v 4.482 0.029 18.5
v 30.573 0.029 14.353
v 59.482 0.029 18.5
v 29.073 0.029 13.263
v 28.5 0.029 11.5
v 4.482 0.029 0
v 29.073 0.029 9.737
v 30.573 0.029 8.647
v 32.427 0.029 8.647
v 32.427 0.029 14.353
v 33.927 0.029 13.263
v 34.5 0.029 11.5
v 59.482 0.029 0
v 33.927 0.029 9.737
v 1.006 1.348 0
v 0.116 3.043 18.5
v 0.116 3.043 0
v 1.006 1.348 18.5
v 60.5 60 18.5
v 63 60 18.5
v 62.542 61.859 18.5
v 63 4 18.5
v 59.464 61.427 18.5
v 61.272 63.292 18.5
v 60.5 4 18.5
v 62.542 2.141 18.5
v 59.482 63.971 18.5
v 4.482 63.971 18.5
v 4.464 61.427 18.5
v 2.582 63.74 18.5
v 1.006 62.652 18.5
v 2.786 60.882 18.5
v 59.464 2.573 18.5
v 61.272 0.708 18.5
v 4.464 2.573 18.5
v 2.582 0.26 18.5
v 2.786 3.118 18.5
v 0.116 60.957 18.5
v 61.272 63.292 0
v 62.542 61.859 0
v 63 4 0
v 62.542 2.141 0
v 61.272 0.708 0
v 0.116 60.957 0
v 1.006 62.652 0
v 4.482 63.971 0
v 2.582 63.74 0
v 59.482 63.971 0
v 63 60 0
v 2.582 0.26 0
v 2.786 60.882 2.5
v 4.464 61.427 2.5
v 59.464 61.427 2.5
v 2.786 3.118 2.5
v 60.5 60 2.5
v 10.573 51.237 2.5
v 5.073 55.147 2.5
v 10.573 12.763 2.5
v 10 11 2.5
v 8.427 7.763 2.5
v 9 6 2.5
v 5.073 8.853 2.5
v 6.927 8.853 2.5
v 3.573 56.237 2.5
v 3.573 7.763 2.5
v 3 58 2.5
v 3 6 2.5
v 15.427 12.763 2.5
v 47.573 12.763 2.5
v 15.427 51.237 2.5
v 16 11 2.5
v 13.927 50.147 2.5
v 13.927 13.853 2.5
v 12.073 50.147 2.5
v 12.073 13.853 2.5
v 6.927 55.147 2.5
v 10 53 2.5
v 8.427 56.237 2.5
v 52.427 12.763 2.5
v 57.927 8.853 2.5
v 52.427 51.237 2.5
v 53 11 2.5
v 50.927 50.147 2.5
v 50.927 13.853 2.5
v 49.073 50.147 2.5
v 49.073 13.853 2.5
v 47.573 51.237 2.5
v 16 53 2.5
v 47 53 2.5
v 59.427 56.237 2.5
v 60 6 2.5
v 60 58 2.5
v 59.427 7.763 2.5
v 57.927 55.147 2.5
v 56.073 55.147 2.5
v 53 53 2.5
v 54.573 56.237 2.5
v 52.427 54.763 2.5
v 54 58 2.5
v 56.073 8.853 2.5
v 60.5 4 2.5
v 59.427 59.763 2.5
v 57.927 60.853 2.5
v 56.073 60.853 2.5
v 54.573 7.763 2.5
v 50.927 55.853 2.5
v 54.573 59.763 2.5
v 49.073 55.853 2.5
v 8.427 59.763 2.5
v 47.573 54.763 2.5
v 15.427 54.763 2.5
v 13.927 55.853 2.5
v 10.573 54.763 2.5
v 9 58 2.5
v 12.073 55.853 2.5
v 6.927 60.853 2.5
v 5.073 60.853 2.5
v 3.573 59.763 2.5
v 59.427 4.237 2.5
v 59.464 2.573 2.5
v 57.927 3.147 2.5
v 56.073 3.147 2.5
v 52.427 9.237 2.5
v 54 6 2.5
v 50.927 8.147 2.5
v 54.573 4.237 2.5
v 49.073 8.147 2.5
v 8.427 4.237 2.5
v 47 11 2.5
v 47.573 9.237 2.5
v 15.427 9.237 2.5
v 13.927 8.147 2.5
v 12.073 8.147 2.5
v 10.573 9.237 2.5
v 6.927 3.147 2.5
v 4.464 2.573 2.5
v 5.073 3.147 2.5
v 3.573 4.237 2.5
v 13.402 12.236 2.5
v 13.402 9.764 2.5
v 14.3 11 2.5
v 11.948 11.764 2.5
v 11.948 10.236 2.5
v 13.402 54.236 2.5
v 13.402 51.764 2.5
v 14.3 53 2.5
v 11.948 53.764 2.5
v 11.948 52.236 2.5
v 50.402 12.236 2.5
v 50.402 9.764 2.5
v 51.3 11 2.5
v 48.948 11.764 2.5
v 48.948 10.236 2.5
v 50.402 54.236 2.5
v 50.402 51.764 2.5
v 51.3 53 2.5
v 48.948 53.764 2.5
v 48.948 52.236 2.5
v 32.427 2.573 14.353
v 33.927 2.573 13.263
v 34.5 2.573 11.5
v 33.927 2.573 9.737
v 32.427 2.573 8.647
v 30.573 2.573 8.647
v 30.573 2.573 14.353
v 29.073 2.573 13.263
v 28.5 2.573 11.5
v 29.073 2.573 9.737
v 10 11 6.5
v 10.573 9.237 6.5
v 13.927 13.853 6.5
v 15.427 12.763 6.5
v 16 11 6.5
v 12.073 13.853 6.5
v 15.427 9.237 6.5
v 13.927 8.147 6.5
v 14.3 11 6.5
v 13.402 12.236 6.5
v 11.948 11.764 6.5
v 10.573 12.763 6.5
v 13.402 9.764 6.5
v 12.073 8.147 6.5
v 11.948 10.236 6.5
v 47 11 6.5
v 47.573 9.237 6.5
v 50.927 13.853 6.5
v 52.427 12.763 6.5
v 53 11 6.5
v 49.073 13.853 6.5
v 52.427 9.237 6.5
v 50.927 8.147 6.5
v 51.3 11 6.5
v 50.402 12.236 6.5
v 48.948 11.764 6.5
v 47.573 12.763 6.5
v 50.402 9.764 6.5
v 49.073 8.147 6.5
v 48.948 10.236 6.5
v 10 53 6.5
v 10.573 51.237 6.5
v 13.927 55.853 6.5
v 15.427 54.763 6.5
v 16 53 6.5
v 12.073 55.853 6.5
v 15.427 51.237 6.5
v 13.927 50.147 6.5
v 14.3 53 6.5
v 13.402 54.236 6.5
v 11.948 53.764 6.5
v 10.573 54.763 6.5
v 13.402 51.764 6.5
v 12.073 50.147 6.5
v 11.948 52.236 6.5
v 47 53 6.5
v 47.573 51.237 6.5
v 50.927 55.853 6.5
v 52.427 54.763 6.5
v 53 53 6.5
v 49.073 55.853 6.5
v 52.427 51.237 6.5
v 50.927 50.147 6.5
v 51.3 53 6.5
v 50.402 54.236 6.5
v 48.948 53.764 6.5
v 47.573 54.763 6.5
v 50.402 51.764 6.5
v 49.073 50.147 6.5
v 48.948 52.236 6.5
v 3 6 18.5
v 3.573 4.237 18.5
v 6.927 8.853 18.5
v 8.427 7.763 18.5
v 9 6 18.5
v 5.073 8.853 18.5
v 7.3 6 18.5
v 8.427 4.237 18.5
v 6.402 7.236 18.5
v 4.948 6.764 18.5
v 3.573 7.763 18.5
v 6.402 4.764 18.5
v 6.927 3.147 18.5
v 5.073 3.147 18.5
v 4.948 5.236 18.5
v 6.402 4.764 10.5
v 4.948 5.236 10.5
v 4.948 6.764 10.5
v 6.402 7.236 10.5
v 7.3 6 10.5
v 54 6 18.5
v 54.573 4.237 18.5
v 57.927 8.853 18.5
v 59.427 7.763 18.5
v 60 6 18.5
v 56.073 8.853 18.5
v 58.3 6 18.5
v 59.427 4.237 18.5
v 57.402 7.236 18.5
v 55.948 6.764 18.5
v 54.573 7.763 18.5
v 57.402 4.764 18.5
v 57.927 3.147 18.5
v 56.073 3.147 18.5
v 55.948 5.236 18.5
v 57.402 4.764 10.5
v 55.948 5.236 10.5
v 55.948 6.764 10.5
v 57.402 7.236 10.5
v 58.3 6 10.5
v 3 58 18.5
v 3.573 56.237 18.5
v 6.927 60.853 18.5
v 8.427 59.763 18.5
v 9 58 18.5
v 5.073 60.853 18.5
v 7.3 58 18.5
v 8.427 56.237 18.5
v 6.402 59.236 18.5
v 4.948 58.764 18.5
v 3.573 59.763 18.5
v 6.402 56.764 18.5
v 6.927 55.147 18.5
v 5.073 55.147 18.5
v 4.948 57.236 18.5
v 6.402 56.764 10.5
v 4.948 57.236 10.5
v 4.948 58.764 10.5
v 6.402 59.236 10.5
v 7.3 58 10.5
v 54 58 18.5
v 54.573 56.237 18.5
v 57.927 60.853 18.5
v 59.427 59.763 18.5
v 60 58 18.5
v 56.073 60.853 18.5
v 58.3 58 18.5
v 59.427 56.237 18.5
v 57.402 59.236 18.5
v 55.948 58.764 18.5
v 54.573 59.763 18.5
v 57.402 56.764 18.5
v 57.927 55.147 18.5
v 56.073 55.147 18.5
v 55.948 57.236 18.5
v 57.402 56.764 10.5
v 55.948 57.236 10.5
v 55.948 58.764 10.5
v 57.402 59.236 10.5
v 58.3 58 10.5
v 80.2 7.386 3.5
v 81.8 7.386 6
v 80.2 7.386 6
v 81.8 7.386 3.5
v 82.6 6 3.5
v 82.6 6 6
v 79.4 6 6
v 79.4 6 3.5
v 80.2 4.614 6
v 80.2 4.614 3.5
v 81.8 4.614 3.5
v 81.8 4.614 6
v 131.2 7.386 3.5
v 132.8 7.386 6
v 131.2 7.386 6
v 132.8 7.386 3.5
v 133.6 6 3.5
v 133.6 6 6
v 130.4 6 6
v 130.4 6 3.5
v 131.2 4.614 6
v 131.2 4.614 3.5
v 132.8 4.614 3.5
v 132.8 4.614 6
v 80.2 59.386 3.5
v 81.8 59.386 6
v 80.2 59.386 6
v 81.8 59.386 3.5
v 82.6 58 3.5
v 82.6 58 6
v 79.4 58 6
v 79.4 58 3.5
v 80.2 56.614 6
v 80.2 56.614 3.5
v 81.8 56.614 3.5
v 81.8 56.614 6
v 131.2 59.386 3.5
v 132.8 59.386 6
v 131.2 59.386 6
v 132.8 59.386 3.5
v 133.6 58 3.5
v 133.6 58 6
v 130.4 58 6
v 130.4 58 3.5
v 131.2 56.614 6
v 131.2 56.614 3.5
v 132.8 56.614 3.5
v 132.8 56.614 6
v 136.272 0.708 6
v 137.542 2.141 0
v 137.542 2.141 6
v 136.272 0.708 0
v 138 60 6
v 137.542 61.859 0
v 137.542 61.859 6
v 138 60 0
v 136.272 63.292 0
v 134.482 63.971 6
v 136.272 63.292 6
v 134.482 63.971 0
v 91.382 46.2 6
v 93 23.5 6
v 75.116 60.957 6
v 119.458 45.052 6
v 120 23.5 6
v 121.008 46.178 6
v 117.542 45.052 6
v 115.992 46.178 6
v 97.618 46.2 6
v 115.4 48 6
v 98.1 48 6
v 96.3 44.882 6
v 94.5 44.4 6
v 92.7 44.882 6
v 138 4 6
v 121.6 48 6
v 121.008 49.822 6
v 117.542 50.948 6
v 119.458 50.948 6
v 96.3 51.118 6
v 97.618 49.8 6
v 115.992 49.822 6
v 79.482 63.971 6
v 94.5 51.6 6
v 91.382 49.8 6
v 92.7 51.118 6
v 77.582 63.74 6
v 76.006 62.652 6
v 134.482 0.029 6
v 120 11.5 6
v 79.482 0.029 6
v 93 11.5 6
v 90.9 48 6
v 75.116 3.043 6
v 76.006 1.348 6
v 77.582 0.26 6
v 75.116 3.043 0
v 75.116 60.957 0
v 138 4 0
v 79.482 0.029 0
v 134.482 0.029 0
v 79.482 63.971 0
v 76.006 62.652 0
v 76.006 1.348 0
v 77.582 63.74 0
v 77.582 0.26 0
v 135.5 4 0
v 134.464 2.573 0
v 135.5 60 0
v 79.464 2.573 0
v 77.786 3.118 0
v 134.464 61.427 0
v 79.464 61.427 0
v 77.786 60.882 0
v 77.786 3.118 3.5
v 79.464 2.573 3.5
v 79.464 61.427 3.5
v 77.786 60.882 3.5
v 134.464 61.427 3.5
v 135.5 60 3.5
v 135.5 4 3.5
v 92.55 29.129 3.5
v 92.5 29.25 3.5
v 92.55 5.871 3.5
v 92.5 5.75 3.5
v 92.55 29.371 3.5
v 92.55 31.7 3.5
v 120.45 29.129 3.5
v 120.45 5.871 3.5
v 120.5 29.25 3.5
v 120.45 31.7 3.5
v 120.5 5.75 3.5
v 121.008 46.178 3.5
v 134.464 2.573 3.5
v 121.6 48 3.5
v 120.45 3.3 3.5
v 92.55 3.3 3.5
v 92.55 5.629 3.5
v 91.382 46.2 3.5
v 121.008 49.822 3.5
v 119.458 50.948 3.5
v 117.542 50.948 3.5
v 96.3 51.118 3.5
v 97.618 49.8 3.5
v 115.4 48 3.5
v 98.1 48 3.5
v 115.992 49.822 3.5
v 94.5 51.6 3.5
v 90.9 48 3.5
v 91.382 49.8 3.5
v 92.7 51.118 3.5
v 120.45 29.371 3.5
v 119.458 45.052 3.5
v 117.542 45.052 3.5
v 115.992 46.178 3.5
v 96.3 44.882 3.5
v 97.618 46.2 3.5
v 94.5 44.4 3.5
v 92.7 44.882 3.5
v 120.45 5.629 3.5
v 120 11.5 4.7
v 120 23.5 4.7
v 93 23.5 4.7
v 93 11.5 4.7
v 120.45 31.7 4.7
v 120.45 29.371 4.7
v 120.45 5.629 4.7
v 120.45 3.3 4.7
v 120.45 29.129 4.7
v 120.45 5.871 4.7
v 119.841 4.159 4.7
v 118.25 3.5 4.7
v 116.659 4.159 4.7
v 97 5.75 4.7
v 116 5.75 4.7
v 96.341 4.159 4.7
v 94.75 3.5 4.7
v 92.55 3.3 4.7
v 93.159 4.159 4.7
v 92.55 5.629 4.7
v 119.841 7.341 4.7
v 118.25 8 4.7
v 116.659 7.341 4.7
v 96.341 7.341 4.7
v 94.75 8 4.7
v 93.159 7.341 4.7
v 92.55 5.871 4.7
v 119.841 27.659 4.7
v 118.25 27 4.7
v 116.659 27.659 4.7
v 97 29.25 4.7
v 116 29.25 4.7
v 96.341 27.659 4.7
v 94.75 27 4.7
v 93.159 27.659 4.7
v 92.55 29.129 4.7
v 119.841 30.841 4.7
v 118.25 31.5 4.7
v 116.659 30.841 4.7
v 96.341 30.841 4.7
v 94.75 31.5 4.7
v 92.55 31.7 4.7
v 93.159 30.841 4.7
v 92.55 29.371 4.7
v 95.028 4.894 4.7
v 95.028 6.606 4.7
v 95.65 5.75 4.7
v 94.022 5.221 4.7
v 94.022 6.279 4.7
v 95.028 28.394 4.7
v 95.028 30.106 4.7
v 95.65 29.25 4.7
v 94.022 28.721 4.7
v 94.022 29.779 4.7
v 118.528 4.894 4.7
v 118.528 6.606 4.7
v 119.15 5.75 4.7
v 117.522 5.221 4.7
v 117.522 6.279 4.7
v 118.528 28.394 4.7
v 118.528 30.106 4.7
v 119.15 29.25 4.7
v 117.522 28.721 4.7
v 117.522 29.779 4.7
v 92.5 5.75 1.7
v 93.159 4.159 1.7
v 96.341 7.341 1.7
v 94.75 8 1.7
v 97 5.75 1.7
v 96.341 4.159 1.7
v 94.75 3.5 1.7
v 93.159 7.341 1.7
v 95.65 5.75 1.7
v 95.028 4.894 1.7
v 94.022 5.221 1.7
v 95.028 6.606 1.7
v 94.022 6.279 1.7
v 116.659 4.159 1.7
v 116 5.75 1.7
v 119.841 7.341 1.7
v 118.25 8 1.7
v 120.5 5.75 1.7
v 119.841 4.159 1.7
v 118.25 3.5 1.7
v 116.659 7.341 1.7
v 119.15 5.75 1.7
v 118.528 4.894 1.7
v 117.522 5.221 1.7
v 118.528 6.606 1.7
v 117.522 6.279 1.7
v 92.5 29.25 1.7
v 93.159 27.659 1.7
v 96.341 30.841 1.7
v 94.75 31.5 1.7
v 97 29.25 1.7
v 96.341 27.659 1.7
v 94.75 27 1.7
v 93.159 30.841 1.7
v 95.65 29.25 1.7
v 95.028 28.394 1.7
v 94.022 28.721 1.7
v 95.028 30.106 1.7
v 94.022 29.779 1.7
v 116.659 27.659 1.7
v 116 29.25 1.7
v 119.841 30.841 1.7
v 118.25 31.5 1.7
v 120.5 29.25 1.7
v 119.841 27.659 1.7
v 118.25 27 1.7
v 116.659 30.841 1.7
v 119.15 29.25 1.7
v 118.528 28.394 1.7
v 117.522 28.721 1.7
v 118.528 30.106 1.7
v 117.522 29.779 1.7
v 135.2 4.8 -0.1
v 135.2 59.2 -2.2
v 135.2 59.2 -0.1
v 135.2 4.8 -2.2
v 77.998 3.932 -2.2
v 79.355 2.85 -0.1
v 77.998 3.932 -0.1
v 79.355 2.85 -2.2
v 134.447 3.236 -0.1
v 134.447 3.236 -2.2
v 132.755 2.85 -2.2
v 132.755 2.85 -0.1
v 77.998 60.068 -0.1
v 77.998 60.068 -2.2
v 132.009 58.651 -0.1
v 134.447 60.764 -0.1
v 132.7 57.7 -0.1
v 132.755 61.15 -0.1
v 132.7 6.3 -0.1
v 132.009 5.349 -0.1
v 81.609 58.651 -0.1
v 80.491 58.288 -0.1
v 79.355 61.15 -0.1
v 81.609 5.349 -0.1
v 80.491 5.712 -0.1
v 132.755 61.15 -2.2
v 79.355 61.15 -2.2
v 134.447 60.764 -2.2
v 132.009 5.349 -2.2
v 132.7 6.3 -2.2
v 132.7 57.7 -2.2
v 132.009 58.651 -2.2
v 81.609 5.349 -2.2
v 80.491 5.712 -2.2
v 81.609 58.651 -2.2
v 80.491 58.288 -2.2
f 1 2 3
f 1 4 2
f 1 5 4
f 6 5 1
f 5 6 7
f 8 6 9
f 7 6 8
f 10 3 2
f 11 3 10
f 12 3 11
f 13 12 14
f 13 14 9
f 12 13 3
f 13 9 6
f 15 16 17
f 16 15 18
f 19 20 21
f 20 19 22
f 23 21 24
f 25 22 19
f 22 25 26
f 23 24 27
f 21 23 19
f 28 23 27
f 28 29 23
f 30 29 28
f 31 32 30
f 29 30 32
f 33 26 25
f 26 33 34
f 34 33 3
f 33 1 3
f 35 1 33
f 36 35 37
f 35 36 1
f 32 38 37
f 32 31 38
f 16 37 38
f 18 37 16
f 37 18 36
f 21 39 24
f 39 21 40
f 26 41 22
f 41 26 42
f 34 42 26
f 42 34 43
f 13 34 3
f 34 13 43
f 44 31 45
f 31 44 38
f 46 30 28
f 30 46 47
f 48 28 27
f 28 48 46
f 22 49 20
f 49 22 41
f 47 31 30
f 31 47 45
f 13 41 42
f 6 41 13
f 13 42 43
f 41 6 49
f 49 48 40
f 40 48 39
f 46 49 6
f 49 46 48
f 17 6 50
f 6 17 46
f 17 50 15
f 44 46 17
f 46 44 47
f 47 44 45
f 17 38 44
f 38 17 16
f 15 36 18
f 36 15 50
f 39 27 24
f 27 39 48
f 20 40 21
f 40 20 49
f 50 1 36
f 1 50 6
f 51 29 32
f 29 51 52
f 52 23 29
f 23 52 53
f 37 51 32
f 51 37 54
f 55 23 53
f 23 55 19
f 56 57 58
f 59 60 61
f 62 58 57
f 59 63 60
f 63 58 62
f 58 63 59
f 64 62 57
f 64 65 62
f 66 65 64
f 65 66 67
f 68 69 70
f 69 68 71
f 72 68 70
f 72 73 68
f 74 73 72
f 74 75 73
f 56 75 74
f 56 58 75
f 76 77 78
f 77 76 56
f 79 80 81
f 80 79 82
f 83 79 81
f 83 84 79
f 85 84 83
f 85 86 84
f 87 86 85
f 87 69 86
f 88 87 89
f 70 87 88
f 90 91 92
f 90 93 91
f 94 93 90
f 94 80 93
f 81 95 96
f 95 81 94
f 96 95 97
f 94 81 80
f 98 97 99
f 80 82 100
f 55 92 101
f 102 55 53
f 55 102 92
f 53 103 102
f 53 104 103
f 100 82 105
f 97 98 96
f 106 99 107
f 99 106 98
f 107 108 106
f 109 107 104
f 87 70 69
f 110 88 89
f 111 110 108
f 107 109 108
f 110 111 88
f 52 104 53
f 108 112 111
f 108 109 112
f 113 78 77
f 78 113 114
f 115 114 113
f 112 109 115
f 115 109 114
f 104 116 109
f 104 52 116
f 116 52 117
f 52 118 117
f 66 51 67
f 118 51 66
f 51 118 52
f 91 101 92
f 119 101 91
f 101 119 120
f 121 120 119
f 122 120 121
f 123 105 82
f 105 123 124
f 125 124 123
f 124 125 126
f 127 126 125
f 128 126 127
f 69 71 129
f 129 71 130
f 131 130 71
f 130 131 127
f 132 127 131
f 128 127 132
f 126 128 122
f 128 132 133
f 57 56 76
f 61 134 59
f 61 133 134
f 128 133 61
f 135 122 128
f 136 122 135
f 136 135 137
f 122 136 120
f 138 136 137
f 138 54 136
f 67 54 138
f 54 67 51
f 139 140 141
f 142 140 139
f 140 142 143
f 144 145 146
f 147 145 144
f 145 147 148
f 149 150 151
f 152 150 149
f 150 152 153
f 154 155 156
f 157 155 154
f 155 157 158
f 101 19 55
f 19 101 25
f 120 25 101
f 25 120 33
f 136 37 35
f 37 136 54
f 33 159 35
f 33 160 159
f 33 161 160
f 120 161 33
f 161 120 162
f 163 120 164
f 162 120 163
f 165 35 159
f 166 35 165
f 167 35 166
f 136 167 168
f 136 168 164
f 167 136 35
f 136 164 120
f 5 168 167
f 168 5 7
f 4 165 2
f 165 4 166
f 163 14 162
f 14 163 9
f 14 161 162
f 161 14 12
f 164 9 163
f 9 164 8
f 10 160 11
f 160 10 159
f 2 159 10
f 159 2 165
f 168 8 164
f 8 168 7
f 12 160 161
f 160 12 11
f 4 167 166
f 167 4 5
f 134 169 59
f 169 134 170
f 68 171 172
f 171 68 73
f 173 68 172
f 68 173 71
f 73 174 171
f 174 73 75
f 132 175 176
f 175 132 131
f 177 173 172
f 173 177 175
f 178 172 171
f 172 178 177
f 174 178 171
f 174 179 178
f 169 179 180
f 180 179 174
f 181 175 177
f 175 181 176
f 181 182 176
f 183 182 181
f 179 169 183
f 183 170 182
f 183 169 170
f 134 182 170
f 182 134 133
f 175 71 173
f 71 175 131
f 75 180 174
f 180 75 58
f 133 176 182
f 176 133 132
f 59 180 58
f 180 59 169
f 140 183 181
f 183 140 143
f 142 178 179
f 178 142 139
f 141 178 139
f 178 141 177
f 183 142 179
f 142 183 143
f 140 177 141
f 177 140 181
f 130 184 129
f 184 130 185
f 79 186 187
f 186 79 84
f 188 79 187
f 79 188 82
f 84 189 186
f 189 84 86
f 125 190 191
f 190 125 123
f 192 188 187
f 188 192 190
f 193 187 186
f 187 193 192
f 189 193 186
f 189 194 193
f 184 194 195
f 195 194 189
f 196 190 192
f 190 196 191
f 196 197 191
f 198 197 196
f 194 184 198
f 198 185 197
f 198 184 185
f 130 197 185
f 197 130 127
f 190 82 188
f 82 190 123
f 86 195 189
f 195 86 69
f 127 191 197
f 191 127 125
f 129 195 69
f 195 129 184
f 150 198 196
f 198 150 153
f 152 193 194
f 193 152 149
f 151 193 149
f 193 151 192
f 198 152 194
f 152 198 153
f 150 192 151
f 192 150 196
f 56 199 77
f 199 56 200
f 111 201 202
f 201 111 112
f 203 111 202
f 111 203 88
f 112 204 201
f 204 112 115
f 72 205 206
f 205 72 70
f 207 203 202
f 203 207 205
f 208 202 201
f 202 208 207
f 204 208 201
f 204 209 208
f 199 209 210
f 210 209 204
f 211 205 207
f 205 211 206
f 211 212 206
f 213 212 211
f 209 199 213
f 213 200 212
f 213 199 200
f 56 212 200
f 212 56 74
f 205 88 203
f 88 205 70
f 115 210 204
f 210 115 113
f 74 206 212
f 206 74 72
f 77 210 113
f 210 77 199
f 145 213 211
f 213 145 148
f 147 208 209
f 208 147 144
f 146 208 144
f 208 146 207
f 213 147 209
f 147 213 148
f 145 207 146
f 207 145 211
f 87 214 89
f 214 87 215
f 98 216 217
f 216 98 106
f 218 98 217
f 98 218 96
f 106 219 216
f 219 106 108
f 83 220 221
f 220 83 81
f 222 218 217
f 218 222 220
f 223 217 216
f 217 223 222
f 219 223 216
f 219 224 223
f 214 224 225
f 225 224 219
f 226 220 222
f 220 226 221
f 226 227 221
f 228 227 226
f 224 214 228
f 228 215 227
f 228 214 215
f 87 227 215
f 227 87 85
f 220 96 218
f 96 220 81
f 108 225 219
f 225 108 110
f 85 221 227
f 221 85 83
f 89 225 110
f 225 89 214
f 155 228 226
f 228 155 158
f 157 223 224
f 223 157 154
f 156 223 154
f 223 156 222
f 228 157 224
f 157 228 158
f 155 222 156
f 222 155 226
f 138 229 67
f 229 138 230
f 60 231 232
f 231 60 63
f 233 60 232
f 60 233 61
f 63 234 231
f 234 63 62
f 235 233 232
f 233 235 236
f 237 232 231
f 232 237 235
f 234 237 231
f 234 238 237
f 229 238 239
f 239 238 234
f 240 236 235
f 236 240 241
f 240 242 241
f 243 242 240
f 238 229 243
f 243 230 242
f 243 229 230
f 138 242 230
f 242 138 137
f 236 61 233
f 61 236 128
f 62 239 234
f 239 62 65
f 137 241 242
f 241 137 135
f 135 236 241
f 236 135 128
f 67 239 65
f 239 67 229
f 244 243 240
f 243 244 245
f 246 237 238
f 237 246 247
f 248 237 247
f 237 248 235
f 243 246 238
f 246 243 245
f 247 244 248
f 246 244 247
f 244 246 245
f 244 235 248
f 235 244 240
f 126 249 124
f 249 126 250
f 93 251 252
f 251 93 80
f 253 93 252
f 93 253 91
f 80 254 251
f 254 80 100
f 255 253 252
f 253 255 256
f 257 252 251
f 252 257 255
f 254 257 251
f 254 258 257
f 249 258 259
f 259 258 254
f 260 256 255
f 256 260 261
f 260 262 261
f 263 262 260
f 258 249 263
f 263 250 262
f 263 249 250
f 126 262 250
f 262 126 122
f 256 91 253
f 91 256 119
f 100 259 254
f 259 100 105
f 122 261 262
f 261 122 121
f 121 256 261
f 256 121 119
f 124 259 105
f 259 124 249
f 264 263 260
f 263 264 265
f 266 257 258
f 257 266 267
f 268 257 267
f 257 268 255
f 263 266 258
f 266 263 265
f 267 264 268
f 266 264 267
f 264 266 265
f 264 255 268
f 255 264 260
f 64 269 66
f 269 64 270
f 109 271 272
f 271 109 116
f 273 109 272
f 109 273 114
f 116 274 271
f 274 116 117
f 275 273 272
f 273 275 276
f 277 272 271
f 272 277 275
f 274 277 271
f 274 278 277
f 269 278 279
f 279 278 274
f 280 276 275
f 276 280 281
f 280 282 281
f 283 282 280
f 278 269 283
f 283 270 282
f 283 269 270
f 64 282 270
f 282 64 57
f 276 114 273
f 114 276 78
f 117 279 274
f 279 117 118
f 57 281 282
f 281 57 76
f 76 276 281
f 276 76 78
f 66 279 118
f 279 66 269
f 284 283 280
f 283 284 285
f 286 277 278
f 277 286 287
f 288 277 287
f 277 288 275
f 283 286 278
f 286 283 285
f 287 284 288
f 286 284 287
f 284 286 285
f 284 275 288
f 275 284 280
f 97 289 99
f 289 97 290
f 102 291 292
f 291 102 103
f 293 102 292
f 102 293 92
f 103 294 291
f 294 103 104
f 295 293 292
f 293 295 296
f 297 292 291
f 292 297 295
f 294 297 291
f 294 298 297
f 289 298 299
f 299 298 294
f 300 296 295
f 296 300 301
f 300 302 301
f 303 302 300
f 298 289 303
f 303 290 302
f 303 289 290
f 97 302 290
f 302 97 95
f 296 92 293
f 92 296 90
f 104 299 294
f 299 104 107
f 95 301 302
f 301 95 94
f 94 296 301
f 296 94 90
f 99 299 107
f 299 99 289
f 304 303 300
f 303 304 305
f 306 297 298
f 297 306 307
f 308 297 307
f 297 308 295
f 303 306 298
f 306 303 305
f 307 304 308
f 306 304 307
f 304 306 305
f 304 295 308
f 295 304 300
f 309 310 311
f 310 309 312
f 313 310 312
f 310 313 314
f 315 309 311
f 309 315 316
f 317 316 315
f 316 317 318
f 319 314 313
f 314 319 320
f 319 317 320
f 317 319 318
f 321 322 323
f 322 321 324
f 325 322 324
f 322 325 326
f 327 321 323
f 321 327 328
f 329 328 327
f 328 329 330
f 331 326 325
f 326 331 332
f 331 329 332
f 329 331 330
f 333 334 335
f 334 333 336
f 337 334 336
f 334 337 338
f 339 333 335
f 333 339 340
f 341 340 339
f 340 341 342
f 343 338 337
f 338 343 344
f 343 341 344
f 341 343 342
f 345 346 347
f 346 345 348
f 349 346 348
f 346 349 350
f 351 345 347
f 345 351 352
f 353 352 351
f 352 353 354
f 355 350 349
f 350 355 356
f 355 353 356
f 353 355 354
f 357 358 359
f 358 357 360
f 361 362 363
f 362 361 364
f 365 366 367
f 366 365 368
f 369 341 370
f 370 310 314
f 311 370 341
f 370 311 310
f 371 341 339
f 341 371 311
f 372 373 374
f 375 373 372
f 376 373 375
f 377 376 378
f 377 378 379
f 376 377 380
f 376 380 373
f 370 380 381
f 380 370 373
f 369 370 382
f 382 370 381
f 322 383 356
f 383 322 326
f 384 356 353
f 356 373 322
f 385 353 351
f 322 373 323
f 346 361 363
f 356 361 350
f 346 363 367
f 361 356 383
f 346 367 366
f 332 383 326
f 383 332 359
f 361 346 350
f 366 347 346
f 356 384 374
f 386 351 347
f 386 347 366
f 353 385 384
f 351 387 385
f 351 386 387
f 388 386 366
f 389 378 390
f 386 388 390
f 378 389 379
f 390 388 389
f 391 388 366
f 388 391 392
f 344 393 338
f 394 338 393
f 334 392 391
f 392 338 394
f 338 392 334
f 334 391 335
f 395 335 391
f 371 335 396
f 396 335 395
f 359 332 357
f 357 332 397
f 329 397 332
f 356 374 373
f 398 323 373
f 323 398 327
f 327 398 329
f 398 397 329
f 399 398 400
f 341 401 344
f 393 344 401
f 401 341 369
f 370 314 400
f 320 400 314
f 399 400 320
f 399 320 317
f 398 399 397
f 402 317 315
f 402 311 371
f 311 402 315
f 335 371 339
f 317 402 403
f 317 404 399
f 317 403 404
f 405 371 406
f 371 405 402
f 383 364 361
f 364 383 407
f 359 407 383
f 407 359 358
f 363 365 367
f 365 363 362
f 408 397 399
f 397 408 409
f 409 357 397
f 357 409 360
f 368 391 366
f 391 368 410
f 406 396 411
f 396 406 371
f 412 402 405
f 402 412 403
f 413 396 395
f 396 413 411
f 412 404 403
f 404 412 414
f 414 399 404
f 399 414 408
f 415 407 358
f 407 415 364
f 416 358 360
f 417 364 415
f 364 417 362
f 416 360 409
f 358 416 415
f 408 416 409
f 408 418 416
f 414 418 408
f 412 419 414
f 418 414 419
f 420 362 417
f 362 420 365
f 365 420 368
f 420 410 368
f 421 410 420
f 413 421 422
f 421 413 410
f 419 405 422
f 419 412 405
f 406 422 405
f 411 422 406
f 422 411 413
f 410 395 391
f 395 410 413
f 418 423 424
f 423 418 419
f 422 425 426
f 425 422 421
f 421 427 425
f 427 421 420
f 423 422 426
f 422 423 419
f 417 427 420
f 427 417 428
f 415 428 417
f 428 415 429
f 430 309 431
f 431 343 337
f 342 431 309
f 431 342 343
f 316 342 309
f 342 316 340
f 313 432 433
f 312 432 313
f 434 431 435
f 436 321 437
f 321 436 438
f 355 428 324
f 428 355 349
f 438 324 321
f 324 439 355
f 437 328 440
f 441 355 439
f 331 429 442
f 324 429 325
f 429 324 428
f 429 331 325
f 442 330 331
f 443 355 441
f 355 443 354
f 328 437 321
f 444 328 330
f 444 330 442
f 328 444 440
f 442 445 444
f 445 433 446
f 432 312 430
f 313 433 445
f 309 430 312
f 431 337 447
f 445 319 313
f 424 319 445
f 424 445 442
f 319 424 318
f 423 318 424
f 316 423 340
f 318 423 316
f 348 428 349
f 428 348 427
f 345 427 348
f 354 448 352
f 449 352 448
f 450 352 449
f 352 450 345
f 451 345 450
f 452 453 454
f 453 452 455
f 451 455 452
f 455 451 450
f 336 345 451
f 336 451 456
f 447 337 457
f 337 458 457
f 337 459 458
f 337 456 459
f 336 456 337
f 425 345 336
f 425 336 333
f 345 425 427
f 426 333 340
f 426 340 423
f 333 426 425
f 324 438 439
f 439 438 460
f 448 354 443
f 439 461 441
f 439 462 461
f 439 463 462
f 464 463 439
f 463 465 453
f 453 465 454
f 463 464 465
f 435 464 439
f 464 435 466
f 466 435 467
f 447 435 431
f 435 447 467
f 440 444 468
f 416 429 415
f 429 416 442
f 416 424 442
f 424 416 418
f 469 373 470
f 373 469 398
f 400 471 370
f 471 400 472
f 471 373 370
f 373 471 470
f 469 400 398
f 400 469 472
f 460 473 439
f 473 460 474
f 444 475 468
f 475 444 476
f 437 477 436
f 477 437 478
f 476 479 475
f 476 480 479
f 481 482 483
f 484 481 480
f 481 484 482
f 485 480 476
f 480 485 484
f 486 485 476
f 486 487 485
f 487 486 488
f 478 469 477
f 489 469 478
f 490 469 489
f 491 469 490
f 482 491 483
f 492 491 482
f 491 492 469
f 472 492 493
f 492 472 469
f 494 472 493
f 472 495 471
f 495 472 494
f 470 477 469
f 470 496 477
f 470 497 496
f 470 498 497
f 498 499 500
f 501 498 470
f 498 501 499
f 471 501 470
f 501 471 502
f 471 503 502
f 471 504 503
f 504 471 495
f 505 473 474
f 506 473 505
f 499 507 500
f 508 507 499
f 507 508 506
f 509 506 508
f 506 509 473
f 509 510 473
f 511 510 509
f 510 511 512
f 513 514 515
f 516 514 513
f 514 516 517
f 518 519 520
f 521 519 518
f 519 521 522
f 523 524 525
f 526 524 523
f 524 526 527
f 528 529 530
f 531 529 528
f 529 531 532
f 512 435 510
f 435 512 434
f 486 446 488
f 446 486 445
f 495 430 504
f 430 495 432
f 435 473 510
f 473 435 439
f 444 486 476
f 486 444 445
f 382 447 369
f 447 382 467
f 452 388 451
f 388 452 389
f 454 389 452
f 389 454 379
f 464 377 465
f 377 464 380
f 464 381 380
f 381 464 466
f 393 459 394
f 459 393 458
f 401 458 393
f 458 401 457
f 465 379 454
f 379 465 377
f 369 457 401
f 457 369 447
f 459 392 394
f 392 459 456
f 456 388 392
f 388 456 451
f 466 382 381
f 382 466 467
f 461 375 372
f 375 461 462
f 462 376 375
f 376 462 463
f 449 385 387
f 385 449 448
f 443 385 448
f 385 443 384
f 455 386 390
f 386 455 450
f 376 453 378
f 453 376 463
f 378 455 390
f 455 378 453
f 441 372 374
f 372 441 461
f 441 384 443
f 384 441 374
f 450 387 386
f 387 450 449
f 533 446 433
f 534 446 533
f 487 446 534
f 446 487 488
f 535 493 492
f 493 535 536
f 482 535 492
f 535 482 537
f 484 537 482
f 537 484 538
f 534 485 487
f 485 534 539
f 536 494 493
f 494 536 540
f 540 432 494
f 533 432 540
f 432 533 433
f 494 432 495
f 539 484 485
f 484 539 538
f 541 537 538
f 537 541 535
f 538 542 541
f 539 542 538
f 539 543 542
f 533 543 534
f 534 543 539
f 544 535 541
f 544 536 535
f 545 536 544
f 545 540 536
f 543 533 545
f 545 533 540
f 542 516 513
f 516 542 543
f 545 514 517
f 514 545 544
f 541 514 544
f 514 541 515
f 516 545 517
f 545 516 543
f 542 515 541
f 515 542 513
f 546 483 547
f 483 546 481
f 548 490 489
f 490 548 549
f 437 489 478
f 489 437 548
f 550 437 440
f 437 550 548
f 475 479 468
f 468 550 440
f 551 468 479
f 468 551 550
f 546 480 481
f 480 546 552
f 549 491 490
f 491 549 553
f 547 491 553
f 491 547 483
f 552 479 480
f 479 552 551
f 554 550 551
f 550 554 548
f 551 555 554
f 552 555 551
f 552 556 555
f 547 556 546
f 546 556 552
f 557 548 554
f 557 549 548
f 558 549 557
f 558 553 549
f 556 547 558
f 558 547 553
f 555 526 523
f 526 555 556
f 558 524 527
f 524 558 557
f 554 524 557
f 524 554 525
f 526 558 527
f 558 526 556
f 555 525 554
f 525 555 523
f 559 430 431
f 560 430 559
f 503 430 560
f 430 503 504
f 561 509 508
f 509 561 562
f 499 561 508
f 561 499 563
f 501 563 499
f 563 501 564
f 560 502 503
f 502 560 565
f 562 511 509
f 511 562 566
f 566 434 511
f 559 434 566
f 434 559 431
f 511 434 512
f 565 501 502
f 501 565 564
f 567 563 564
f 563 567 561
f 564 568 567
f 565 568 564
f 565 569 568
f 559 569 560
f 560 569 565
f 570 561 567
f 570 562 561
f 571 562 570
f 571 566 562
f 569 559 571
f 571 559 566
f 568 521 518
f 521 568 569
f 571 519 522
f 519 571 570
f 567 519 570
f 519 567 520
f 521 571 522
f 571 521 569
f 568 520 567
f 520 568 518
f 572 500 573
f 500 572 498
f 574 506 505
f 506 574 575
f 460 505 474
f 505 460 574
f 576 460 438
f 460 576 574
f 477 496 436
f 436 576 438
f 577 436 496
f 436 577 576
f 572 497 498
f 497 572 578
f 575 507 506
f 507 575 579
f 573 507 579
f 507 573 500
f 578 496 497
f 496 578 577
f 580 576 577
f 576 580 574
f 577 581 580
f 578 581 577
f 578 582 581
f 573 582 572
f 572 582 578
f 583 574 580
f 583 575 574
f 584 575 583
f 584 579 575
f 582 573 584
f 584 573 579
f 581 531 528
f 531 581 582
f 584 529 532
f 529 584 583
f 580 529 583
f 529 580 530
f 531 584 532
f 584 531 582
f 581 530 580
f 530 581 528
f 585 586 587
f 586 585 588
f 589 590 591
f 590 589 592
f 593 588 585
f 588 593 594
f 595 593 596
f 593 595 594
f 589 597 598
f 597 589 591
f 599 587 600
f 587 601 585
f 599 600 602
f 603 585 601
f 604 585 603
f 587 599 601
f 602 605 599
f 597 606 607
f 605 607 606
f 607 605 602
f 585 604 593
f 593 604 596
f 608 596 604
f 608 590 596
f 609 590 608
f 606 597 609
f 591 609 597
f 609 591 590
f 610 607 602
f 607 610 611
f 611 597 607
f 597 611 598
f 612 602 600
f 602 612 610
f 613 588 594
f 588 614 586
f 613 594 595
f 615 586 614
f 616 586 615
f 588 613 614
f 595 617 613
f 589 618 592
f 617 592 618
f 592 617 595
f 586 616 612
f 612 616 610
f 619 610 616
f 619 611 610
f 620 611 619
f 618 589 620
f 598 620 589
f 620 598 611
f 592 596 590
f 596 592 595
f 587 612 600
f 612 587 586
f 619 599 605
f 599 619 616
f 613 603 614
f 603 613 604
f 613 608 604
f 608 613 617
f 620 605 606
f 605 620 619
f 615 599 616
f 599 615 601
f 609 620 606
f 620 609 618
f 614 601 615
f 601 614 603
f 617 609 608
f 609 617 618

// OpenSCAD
// ============================================================
// PENDANT ENCLOSURE
// Houses the pendant PCB, OLED display, rotary encoder, and index
// button. Connects to the main board enclosure via an 8-conductor
// cable entering through the back wall.
// ============================================================

// ============= PARAMETERS (edit to match your parts) =============

wall = 2.5;
corner_r = 4;

// --- Pendant PCB (from pendant_copper_reference.svg / pcb_build_guide.md) ---
// 45 x 46mm board, 4 corner mounting holes at local (4,2), (41,2),
// (4,44), (41,44).
pcb_w = 45;
pcb_d = 46;
pcb_margin = 9;
pcb_hole_dia = 3.2;
pcb_standoff_od = 6;
pcb_standoff_h = 4;

box_w = pcb_w + 2*pcb_margin;   // 63
box_d = pcb_d + 2*pcb_margin;   // 64
pcb_offset_x = pcb_margin;
pcb_offset_y = pcb_margin;

box_h_base = pcb_standoff_h + wall + 12;
box_h_lid  = 6;    // taller lid: OLED window + encoder/button bosses live here

post_inset = 6;    // kept clear of the PCB standoffs (~8.6mm away)
post_od = 6;
post_pilot_d = 2.6;
post_pilot_depth = 8;
post_positions = [
  [post_inset, post_inset],
  [box_w - post_inset, post_inset],
  [post_inset, box_d - post_inset],
  [box_w - post_inset, box_d - post_inset],
];

// --- OLED (0.96" SSD1306 — MEASURE YOUR MODULE, this varies by supplier) ---
oled_glass_w = 27;
oled_glass_h = 12;
oled_board_w = 27.3;
oled_board_h = 27.8; // many 0.96" modules are taller than the glass (mounting ears)
oled_hole_dx = 23.5;
oled_hole_dy = 23.5;
oled_standoff_od = 4.5;
oled_standoff_id = 1.8;   // pilot for M2 self-tapper
oled_standoff_h = 3;
oled_cx = box_w/2;
oled_cy = 17.5;

// --- Rotary encoder (e.g. KY-040) ---
enc_hole_d = 7.2;    // shaft bushing clearance — check your encoder's thread
enc_cx = box_w/2 - 12;
enc_cy = 48;

// --- Index button ---
btn_hole_d = 6.2;
btn_cx = box_w/2 + 12;
btn_cy = 48;

// --- Incoming 8-conductor cable, back wall ---
cable_hole_d = 6;
cable_cx = box_w/2;
cable_z = wall + pcb_standoff_h + 5;

// ============= MODULES =============

module rounded_box(w, d, h, r) {
  hull() {
    for (x = [r, w - r])
      for (y = [r, d - r])
        translate([x, y, 0])
          cylinder(h = h, r = r);
  }
}

module base() {
  difference() {
    rounded_box(box_w, box_d, box_h_base, corner_r);

    translate([wall, wall, wall])
      rounded_box(box_w - 2*wall, box_d - 2*wall, box_h_base, max(corner_r - wall, 0.1));

    // incoming cable, back wall (y = 0)
    translate([cable_cx, -1, cable_z])
      rotate([-90,0,0])
        cylinder(h = wall + 2, d = cable_hole_d);
  }

  pcb_hole_positions = [
    [pcb_offset_x + 4,  pcb_offset_y + 2],
    [pcb_offset_x + 41, pcb_offset_y + 2],
    [pcb_offset_x + 4,  pcb_offset_y + 44],
    [pcb_offset_x + 41, pcb_offset_y + 44],
  ];
  for (p = pcb_hole_positions) {
    translate([p[0], p[1], wall])
      difference() {
        cylinder(h = pcb_standoff_h, d = pcb_standoff_od);
        cylinder(h = pcb_standoff_h + 1, d = pcb_hole_dia - 0.6);
      }
  }

  for (p = post_positions) {
    translate([p[0], p[1], wall])
      difference() {
        cylinder(h = box_h_base - wall, d = post_od);
        translate([0, 0, (box_h_base - wall) - post_pilot_depth])
          cylinder(h = post_pilot_depth + 1, d = post_pilot_d);
      }
  }
}

module lid() {
  top_z1 = box_h_lid;
  top_z0 = box_h_lid - wall;
  recess_depth = 1.2;

  difference() {
    rounded_box(box_w, box_d, box_h_lid, corner_r);

    translate([wall, wall, -1])
      rounded_box(box_w - 2*wall, box_d - 2*wall, top_z0 + 1, max(corner_r - wall, 0.1));

    translate([oled_cx - oled_glass_w/2, oled_cy - oled_glass_h/2, top_z0 - 1])
      cube([oled_glass_w, oled_glass_h, wall + 2]);

    translate([oled_cx - (oled_board_w+0.6)/2, oled_cy - (oled_board_h+0.6)/2, top_z0])
      cube([oled_board_w + 0.6, oled_board_h + 0.6, recess_depth]);

    translate([enc_cx, enc_cy, -1])
      cylinder(h = box_h_lid + 2, d = enc_hole_d);

    translate([btn_cx, btn_cy, -1])
      cylinder(h = box_h_lid + 2, d = btn_hole_d);

    for (p = post_positions) {
      translate([p[0], p[1], -1])
        cylinder(h = box_h_lid + 2, d = 3.2);
    }
  }

  oled_hole_positions = [
    [oled_cx - oled_hole_dx/2, oled_cy - oled_hole_dy/2],
    [oled_cx + oled_hole_dx/2, oled_cy - oled_hole_dy/2],
    [oled_cx - oled_hole_dx/2, oled_cy + oled_hole_dy/2],
    [oled_cx + oled_hole_dx/2, oled_cy + oled_hole_dy/2],
  ];
  for (p = oled_hole_positions) {
    translate([p[0], p[1], top_z0 + recess_depth - oled_standoff_h])
      difference() {
        cylinder(h = oled_standoff_h, d = oled_standoff_od);
        translate([0, 0, -0.5])
          cylinder(h = oled_standoff_h + 1, d = oled_standoff_id);
      }
  }

  translate([wall + 0.3, wall + 0.3, -2.2])
    difference() {
      rounded_box(box_w - 2*wall - 0.6, box_d - 2*wall - 0.6, 2.1, 2);
      translate([wall, wall, -1])
        rounded_box(box_w - 4*wall - 0.6, box_d - 4*wall - 0.6, 4.1, 1);
    }
}

// ============= LAYOUT FOR PRINTING =============
base();
translate([box_w + 12, 0, 0])
  lid();
